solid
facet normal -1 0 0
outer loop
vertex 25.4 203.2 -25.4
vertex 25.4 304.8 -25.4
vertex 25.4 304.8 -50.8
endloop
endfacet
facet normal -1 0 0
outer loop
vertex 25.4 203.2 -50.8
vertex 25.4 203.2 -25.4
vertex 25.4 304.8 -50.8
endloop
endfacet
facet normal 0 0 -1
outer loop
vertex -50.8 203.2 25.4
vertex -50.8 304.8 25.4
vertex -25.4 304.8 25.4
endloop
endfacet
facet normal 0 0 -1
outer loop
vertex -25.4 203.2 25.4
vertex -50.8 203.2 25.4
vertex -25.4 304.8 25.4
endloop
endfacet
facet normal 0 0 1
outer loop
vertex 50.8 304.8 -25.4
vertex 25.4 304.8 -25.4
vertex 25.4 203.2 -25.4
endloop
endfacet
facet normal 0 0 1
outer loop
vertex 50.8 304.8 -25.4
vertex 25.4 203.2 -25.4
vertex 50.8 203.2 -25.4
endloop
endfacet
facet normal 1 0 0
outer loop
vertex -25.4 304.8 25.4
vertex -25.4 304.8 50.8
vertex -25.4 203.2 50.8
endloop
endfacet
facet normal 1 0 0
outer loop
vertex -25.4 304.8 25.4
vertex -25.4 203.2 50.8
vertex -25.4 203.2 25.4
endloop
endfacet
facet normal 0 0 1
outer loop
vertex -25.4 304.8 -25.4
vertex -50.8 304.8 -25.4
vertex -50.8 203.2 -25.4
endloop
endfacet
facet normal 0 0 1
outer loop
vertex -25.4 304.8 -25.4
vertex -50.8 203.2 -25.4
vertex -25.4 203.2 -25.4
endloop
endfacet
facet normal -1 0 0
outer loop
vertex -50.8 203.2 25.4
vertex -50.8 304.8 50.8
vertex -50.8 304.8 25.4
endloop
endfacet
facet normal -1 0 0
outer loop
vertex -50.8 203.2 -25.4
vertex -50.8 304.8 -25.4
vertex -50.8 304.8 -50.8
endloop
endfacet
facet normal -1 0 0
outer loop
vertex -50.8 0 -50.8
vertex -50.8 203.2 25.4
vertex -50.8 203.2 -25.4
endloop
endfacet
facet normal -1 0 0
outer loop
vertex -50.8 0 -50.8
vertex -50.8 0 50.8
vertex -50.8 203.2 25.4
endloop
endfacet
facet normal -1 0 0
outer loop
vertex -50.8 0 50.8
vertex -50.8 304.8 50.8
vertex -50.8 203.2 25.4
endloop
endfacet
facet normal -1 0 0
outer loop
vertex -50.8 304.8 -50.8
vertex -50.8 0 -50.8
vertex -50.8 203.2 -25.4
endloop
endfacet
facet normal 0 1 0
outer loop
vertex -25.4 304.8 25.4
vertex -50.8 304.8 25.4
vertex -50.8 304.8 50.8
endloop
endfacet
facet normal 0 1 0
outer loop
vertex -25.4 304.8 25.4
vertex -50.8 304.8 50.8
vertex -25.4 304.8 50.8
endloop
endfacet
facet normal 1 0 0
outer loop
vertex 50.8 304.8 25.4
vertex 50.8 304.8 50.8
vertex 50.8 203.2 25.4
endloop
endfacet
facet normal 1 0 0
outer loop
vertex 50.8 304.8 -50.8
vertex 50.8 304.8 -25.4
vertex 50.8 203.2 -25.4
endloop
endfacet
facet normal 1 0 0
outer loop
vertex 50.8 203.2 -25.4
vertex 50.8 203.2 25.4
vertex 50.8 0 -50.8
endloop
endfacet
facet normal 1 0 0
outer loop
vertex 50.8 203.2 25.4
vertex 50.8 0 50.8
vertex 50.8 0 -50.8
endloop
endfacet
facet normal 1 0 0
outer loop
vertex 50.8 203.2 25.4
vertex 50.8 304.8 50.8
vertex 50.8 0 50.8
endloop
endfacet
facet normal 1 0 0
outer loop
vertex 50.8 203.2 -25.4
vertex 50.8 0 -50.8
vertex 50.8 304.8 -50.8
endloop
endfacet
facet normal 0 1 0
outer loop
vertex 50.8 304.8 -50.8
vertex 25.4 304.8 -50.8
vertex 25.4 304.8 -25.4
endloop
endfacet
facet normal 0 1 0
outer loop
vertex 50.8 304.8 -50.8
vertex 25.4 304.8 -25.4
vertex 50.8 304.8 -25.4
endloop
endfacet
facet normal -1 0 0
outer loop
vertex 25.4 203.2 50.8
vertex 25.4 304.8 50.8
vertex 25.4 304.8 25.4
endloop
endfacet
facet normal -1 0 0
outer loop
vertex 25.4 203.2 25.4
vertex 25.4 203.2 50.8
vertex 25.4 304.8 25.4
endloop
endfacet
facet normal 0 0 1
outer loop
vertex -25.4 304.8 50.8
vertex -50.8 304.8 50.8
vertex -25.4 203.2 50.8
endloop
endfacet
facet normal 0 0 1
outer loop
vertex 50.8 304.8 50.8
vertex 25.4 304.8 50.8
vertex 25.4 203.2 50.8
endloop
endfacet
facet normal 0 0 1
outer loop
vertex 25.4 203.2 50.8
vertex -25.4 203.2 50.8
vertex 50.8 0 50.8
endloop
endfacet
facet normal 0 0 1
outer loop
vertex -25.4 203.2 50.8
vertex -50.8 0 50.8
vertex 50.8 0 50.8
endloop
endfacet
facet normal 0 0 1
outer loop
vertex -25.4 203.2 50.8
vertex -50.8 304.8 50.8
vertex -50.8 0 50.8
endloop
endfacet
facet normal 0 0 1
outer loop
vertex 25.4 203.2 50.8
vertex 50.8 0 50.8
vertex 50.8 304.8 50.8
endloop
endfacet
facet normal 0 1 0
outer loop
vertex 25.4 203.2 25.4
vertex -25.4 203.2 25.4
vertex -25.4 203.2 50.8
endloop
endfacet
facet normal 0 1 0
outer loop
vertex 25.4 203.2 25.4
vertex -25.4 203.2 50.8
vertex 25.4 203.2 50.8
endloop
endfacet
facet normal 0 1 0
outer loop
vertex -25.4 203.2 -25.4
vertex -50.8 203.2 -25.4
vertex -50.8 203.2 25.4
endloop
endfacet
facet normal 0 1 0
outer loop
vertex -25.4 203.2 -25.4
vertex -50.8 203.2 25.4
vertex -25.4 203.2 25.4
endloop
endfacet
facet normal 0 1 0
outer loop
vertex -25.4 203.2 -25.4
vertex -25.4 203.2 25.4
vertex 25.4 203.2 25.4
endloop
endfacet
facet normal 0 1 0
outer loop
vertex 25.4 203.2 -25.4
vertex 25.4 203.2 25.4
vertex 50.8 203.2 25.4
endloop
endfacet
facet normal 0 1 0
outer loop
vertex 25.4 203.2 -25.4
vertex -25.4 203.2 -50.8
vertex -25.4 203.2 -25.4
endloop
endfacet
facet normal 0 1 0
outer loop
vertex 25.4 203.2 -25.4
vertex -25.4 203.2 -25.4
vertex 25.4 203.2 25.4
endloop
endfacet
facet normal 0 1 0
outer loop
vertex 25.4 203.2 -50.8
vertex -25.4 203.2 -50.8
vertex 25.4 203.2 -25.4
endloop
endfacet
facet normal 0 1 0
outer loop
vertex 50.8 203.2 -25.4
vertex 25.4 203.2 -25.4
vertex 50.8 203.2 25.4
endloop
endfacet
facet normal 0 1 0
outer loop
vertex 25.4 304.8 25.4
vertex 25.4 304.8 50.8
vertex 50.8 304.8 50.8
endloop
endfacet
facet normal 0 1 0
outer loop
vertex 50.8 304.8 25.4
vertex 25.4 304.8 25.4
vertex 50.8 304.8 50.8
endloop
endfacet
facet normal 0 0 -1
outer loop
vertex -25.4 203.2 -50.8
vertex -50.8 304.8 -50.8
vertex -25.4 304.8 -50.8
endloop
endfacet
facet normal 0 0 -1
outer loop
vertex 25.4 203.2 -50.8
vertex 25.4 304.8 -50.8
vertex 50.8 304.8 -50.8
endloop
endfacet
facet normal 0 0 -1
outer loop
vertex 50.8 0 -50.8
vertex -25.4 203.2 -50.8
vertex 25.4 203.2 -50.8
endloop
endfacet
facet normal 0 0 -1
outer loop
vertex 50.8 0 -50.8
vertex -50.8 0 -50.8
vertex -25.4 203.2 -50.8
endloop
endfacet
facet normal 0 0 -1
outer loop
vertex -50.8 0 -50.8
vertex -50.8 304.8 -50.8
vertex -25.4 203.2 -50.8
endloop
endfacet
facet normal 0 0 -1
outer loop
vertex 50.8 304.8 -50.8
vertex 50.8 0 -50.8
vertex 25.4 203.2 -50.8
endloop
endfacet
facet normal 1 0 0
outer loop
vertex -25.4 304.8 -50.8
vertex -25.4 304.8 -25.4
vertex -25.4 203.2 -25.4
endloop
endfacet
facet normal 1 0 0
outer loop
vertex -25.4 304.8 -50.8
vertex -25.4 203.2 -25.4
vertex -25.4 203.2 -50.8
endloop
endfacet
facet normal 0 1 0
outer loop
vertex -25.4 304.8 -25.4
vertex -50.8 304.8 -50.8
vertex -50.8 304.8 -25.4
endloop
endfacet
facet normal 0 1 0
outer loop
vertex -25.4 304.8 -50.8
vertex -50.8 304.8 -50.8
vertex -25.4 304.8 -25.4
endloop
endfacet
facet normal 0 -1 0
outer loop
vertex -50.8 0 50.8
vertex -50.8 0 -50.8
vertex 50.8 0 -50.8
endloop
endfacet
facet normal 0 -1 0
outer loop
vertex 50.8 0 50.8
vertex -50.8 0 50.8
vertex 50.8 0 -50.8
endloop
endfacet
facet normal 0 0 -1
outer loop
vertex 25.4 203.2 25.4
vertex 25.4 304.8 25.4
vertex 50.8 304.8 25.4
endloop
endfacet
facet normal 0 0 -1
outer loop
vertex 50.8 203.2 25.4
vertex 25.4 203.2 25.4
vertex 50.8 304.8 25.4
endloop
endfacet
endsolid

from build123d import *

# Parameters (mm, degrees)
SKETCH1_W           = 101.6
SKETCH1_H           = 101.6
BOSS_EXTRUDE1_DEPTH = 304.8
SKETCH2_W           = 50.8
SKETCH2_H           = 101.6
SKETCH2_W_2         = 101.6
SKETCH2_H_2         = 50.8
CUT_EXTRUDE3_DEPTH  = 101.6


with BuildPart() as part:
    # Sketch1 → Boss-Extrude1 (new body)
    with BuildSketch(Plane(origin=(0, 0, 0), x_dir=(1, 0, 0), z_dir=(0, 1, 0))):
        Rectangle(SKETCH1_W, SKETCH1_H)
    extrude(amount=BOSS_EXTRUDE1_DEPTH)

    # Sketch2 → Cut-Extrude3 (cut)
    with BuildSketch(Plane(origin=(0, 304.8, 0), x_dir=(1, 0, 0), z_dir=(0, 1, 0))):
        Rectangle(SKETCH2_W, SKETCH2_H)
        Rectangle(SKETCH2_W_2, SKETCH2_H_2)
    extrude(amount=-CUT_EXTRUDE3_DEPTH, mode=Mode.SUBTRACT)


solid = part.part
